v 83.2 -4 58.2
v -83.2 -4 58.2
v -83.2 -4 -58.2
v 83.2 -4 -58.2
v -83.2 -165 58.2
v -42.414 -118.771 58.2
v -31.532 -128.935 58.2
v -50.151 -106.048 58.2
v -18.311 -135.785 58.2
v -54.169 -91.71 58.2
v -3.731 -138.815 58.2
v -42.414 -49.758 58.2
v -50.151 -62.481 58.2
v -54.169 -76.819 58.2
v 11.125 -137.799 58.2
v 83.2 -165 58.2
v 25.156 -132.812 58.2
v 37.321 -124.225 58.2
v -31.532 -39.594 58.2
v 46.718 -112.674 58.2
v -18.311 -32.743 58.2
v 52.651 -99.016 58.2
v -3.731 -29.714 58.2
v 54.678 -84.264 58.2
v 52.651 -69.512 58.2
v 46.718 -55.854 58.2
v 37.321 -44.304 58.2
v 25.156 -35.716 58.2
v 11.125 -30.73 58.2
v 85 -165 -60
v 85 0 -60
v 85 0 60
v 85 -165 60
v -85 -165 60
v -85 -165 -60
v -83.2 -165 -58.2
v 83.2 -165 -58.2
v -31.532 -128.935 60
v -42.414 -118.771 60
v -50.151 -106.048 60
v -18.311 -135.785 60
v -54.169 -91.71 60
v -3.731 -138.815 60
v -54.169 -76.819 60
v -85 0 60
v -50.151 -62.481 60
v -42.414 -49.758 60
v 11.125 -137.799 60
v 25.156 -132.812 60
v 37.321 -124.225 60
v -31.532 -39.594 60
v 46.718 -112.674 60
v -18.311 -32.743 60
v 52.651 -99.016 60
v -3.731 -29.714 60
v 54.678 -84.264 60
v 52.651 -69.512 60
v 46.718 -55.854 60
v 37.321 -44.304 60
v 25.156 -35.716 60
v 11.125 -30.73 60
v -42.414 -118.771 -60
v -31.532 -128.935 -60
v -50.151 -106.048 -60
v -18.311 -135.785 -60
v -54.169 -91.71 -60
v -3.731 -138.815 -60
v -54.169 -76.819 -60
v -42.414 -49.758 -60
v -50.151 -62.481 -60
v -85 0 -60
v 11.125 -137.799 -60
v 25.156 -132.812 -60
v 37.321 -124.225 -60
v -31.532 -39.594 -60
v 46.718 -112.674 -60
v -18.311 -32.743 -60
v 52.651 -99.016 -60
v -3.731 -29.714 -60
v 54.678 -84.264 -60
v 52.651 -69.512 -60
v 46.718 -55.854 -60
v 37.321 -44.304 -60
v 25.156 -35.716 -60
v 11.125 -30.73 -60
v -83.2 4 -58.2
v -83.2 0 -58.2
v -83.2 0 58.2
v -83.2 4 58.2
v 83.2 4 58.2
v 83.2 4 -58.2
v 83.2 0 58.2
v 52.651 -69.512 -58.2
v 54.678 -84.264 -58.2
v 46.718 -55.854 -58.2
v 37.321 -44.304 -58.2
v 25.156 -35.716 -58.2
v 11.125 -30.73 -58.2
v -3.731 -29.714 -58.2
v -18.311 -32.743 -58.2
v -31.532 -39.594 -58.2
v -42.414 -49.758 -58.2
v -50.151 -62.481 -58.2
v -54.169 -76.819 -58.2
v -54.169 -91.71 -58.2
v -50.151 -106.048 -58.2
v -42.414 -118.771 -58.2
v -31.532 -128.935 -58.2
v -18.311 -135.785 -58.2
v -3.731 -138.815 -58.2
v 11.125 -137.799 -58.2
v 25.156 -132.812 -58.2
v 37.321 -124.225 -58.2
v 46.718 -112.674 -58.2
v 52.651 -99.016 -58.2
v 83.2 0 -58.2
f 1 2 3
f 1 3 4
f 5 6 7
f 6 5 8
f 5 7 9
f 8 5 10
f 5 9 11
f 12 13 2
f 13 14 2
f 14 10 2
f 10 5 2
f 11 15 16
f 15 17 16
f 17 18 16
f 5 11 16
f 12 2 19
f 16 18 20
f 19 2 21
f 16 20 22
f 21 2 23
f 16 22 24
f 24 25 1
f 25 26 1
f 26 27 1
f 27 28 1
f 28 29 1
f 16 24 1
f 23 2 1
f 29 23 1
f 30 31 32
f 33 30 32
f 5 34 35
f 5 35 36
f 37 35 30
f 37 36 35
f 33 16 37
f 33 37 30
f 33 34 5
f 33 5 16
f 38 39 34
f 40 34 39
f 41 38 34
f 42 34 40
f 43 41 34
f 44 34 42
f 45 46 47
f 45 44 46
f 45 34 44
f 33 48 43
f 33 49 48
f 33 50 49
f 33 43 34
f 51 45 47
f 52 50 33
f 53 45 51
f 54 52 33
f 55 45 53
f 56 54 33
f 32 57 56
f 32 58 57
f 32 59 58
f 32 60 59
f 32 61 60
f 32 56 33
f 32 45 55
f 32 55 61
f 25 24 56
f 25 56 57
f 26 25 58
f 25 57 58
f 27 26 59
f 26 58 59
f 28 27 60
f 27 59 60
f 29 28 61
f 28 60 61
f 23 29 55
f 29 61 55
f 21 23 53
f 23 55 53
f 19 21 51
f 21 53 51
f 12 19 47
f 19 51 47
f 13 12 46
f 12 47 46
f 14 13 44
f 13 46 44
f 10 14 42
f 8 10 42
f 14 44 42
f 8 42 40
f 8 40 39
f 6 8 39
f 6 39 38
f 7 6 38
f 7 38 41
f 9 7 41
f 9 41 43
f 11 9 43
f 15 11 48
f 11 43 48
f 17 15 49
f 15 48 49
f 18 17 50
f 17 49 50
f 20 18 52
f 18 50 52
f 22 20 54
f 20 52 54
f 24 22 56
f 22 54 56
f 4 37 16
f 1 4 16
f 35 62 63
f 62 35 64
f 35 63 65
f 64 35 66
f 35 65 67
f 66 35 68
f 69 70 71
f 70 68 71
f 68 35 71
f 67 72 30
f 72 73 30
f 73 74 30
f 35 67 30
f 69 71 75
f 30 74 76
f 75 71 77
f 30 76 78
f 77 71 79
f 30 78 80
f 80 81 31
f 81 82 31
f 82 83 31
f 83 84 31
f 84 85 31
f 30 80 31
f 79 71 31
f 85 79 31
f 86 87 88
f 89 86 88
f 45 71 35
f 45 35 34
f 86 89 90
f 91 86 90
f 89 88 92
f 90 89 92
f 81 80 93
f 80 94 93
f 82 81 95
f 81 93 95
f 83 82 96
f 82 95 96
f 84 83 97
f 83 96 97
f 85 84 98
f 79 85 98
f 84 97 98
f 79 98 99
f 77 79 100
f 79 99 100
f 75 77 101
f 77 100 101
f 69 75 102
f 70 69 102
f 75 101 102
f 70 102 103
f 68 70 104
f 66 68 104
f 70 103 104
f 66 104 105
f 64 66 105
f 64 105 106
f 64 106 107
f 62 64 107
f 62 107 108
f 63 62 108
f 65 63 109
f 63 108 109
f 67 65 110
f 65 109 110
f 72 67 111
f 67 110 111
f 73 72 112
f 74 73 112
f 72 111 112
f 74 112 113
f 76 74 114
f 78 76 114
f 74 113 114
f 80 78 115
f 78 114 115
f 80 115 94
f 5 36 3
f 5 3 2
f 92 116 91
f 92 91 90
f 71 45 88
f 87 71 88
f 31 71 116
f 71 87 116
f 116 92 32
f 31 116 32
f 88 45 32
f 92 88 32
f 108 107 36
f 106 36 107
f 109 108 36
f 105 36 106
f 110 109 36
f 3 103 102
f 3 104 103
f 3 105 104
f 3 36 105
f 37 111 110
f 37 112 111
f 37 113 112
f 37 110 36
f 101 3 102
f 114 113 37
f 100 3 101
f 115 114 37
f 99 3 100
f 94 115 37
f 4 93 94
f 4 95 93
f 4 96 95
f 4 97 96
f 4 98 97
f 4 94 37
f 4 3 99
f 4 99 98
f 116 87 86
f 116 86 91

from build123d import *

# Parameters (mm, degrees)
F0_W     = 170
F0_H     = 120
F0_W_2   = 166.4
F0_H_2   = 116.4
F1_DEPTH = 165
F3_R     = 54.678141
F4_DEPTH = 159
F6_DEPTH = 4


with BuildPart() as f1:
    # F0 (on Front) → F1 (new body)
    with BuildSketch(Plane.XZ):
        Rectangle(F0_W, F0_H)
        Rectangle(F0_W_2, F0_H_2, mode=Mode.SUBTRACT)
    extrude(amount=F1_DEPTH)


with BuildPart() as f4:
    # F3 (on face) → F4 (new body, symmetric)
    with BuildSketch(Plane.XY.offset(60)):
        with Locations((0, -84.26436)):
            Circle(F3_R)
    extrude(amount=F4_DEPTH, both=True)


with BuildPart() as f1_1:
    add(f1.part)

    # F5: cut F4
    add(f4.part, mode=Mode.SUBTRACT)

    # F0 (on Front) → F6 (join, symmetric)
    with BuildSketch(Plane.XZ):
        Rectangle(F0_W_2, F0_H_2)
    extrude(amount=F6_DEPTH, both=True)


solid = f1_1.part
